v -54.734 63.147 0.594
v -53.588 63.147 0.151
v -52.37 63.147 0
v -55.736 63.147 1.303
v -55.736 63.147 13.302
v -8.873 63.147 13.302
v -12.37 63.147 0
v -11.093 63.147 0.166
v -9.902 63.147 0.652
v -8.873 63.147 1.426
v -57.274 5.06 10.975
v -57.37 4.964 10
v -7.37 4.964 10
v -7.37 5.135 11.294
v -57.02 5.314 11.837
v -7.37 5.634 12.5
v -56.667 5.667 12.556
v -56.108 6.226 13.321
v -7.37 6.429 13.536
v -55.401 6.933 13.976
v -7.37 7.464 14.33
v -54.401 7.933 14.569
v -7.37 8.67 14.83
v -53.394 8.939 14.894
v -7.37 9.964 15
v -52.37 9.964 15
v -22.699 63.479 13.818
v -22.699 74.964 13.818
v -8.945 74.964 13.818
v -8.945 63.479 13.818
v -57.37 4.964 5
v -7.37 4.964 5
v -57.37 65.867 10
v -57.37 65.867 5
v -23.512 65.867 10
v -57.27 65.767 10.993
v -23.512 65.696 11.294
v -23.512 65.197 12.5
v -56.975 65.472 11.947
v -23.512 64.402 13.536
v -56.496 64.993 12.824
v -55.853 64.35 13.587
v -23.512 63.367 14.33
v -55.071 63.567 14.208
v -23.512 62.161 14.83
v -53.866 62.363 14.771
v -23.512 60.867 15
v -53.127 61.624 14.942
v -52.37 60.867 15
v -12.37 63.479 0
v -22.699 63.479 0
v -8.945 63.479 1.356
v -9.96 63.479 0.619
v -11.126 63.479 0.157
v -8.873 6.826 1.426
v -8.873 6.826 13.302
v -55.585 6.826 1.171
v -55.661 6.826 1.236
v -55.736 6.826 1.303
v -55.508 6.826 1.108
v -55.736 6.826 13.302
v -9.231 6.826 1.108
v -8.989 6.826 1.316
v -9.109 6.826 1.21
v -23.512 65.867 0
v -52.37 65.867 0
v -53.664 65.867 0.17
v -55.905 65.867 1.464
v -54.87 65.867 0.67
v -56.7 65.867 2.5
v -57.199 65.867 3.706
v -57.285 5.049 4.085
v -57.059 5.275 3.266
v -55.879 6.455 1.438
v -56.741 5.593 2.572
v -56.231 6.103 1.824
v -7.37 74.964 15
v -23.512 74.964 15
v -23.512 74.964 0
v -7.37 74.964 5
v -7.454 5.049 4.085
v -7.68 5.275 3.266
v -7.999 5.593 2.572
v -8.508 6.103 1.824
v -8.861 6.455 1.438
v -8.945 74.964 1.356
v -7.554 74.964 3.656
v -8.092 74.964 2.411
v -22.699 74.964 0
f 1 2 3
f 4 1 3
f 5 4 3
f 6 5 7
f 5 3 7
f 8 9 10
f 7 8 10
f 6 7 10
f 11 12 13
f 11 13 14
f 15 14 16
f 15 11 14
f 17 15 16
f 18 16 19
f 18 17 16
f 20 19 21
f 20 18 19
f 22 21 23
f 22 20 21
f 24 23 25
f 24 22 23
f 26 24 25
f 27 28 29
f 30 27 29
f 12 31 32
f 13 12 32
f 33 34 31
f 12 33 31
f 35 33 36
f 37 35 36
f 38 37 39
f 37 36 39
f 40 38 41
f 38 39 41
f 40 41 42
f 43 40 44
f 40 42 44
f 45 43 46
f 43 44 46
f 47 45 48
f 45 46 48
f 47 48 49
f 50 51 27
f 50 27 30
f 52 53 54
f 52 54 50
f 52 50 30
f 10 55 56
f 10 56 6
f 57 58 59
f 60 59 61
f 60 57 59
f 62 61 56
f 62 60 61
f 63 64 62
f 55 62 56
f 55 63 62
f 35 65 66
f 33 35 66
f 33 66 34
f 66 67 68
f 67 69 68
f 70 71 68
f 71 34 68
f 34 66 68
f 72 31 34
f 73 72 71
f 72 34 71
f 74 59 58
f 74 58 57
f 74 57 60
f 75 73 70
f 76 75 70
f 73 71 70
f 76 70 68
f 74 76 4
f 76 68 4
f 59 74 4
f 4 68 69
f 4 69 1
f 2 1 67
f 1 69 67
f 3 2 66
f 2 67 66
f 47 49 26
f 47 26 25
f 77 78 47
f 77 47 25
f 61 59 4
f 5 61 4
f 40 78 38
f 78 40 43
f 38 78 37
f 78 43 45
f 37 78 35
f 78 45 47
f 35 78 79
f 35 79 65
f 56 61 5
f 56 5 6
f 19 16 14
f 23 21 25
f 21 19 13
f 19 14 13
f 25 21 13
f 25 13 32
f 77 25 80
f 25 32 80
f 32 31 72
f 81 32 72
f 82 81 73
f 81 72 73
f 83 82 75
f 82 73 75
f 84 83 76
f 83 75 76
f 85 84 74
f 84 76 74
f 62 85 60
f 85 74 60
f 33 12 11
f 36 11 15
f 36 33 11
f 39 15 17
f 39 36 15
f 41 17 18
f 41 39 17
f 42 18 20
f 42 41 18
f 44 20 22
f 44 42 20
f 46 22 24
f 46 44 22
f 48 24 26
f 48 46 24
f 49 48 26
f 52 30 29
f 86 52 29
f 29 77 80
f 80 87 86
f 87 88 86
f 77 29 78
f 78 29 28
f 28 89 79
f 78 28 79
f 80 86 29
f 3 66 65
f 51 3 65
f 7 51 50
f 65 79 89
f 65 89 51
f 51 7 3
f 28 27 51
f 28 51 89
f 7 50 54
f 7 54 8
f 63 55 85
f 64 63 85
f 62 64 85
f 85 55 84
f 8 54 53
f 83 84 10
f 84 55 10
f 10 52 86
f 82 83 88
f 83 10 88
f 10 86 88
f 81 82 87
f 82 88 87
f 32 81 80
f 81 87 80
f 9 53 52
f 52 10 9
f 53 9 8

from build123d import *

# Parameters (mm, degrees)
F1_DEPTH    = 15
F2_W        = 46.8627084047
F2_H        = 56.3212386332
F3_DEPTH    = 13.30162
F4_W        = 13.7536320835
F4_H        = 12.7884671092
F5_DEPTH    = 13.81799
F6_T1_DEPTH = 75
F6_T3_DEPTH = 85.9022176913
F6_T5_DEPTH = 46.3573584799
F6_T7_DEPTH = 95


# Not quite as in the source:
# - a fillet or chamfer that OpenCascade refuses, or shapes differently, is made with other operations: its cross-section is extruded or revolved along the edge and cut away or added


with BuildPart() as f1:
    # F0 (on Top) → F1 (new body)
    with BuildSketch(Plane.XY):
        Polygon((-57.3696343694, 65.8665671945), (-57.3696343694, 4.9643495032), (-7.3696343694, 4.9643495032), (-7.3696343694, 74.9643495032), (-23.5122758895, 74.9643495032), (-23.5122758895, 65.8665671945), align=None)
    extrude(amount=F1_DEPTH)

    # F2 (on Top) → F3 (cut)
    with BuildSketch(Plane.XY):
        with Locations((-32.3047889397, 34.9865604658)):
            Rectangle(F2_W, F2_H)
    extrude(amount=F3_DEPTH, mode=Mode.SUBTRACT)

    # F4 (on Top) → F5 (cut)
    with BuildSketch(Plane.XY):
        with Locations((-15.8223016188, 69.8727704585)):
            Rectangle(F4_W, F4_H)
    extrude(amount=F5_DEPTH, mode=Mode.SUBTRACT)

    # F6: fillet of radius 5 on 6 edges, made by hand

    # F6_s2 → F6_t1 (cut)
    with BuildSketch(Plane.YZ.offset(-69.8696343694)):
        with BuildLine():
            ThreePointArc((4.9643495032, 10), (6.4288155972, 13.5355339059), (9.9643495032, 15))
            Line((9.9643495032, 15), (4.9643495032, 15))
            Line((4.9643495032, 15), (4.9643495032, 10))
        make_face()
        with BuildLine():
            ThreePointArc((4.9643495032, 5), (6.4288155972, 1.4644660941), (9.9643495032, 0))
            Line((9.9643495032, 0), (4.9643495032, 0))
            Line((4.9643495032, 0), (4.9643495032, 5))
        make_face()
    extrude(amount=F6_T1_DEPTH, mode=Mode.SUBTRACT)

    # F6_s4 → F6_t3 (cut)
    with BuildSketch(Plane.XZ.offset(-78.3665671945)):
        with BuildLine():
            ThreePointArc((-57.3696343694, 10), (-55.9051682753, 13.5355339059), (-52.3696343694, 15))
            Line((-52.3696343694, 15), (-57.3696343694, 15))
            Line((-57.3696343694, 15), (-57.3696343694, 10))
        make_face()
        with BuildLine():
            ThreePointArc((-57.3696343694, 5), (-55.9051682753, 1.4644660941), (-52.3696343694, 0))
            Line((-52.3696343694, 0), (-57.3696343694, 0))
            Line((-57.3696343694, 0), (-57.3696343694, 5))
        make_face()
    extrude(amount=F6_T3_DEPTH, mode=Mode.SUBTRACT)

    # F6_s6 → F6_t5 (cut)
    with BuildSketch(Plane.YZ.offset(-69.8696343694)):
        with BuildLine():
            ThreePointArc((65.8665671945, 10), (64.4021011004, 13.5355339059), (60.8665671945, 15))
            Line((60.8665671945, 15), (65.8665671945, 15))
            Line((65.8665671945, 15), (65.8665671945, 10))
        make_face()
    extrude(amount=F6_T5_DEPTH, mode=Mode.SUBTRACT)

    # F6_s8 → F6_t7 (cut)
    with BuildSketch(Plane.XZ.offset(-87.4643495032)):
        with BuildLine():
            ThreePointArc((-12.3696343694, 0), (-8.8341004635, 1.4644660941), (-7.3696343694, 5))
            Line((-7.3696343694, 5), (-7.3696343694, 0))
            Line((-7.3696343694, 0), (-12.3696343694, 0))
        make_face()
    extrude(amount=F6_T7_DEPTH, mode=Mode.SUBTRACT)


solid = f1.part
